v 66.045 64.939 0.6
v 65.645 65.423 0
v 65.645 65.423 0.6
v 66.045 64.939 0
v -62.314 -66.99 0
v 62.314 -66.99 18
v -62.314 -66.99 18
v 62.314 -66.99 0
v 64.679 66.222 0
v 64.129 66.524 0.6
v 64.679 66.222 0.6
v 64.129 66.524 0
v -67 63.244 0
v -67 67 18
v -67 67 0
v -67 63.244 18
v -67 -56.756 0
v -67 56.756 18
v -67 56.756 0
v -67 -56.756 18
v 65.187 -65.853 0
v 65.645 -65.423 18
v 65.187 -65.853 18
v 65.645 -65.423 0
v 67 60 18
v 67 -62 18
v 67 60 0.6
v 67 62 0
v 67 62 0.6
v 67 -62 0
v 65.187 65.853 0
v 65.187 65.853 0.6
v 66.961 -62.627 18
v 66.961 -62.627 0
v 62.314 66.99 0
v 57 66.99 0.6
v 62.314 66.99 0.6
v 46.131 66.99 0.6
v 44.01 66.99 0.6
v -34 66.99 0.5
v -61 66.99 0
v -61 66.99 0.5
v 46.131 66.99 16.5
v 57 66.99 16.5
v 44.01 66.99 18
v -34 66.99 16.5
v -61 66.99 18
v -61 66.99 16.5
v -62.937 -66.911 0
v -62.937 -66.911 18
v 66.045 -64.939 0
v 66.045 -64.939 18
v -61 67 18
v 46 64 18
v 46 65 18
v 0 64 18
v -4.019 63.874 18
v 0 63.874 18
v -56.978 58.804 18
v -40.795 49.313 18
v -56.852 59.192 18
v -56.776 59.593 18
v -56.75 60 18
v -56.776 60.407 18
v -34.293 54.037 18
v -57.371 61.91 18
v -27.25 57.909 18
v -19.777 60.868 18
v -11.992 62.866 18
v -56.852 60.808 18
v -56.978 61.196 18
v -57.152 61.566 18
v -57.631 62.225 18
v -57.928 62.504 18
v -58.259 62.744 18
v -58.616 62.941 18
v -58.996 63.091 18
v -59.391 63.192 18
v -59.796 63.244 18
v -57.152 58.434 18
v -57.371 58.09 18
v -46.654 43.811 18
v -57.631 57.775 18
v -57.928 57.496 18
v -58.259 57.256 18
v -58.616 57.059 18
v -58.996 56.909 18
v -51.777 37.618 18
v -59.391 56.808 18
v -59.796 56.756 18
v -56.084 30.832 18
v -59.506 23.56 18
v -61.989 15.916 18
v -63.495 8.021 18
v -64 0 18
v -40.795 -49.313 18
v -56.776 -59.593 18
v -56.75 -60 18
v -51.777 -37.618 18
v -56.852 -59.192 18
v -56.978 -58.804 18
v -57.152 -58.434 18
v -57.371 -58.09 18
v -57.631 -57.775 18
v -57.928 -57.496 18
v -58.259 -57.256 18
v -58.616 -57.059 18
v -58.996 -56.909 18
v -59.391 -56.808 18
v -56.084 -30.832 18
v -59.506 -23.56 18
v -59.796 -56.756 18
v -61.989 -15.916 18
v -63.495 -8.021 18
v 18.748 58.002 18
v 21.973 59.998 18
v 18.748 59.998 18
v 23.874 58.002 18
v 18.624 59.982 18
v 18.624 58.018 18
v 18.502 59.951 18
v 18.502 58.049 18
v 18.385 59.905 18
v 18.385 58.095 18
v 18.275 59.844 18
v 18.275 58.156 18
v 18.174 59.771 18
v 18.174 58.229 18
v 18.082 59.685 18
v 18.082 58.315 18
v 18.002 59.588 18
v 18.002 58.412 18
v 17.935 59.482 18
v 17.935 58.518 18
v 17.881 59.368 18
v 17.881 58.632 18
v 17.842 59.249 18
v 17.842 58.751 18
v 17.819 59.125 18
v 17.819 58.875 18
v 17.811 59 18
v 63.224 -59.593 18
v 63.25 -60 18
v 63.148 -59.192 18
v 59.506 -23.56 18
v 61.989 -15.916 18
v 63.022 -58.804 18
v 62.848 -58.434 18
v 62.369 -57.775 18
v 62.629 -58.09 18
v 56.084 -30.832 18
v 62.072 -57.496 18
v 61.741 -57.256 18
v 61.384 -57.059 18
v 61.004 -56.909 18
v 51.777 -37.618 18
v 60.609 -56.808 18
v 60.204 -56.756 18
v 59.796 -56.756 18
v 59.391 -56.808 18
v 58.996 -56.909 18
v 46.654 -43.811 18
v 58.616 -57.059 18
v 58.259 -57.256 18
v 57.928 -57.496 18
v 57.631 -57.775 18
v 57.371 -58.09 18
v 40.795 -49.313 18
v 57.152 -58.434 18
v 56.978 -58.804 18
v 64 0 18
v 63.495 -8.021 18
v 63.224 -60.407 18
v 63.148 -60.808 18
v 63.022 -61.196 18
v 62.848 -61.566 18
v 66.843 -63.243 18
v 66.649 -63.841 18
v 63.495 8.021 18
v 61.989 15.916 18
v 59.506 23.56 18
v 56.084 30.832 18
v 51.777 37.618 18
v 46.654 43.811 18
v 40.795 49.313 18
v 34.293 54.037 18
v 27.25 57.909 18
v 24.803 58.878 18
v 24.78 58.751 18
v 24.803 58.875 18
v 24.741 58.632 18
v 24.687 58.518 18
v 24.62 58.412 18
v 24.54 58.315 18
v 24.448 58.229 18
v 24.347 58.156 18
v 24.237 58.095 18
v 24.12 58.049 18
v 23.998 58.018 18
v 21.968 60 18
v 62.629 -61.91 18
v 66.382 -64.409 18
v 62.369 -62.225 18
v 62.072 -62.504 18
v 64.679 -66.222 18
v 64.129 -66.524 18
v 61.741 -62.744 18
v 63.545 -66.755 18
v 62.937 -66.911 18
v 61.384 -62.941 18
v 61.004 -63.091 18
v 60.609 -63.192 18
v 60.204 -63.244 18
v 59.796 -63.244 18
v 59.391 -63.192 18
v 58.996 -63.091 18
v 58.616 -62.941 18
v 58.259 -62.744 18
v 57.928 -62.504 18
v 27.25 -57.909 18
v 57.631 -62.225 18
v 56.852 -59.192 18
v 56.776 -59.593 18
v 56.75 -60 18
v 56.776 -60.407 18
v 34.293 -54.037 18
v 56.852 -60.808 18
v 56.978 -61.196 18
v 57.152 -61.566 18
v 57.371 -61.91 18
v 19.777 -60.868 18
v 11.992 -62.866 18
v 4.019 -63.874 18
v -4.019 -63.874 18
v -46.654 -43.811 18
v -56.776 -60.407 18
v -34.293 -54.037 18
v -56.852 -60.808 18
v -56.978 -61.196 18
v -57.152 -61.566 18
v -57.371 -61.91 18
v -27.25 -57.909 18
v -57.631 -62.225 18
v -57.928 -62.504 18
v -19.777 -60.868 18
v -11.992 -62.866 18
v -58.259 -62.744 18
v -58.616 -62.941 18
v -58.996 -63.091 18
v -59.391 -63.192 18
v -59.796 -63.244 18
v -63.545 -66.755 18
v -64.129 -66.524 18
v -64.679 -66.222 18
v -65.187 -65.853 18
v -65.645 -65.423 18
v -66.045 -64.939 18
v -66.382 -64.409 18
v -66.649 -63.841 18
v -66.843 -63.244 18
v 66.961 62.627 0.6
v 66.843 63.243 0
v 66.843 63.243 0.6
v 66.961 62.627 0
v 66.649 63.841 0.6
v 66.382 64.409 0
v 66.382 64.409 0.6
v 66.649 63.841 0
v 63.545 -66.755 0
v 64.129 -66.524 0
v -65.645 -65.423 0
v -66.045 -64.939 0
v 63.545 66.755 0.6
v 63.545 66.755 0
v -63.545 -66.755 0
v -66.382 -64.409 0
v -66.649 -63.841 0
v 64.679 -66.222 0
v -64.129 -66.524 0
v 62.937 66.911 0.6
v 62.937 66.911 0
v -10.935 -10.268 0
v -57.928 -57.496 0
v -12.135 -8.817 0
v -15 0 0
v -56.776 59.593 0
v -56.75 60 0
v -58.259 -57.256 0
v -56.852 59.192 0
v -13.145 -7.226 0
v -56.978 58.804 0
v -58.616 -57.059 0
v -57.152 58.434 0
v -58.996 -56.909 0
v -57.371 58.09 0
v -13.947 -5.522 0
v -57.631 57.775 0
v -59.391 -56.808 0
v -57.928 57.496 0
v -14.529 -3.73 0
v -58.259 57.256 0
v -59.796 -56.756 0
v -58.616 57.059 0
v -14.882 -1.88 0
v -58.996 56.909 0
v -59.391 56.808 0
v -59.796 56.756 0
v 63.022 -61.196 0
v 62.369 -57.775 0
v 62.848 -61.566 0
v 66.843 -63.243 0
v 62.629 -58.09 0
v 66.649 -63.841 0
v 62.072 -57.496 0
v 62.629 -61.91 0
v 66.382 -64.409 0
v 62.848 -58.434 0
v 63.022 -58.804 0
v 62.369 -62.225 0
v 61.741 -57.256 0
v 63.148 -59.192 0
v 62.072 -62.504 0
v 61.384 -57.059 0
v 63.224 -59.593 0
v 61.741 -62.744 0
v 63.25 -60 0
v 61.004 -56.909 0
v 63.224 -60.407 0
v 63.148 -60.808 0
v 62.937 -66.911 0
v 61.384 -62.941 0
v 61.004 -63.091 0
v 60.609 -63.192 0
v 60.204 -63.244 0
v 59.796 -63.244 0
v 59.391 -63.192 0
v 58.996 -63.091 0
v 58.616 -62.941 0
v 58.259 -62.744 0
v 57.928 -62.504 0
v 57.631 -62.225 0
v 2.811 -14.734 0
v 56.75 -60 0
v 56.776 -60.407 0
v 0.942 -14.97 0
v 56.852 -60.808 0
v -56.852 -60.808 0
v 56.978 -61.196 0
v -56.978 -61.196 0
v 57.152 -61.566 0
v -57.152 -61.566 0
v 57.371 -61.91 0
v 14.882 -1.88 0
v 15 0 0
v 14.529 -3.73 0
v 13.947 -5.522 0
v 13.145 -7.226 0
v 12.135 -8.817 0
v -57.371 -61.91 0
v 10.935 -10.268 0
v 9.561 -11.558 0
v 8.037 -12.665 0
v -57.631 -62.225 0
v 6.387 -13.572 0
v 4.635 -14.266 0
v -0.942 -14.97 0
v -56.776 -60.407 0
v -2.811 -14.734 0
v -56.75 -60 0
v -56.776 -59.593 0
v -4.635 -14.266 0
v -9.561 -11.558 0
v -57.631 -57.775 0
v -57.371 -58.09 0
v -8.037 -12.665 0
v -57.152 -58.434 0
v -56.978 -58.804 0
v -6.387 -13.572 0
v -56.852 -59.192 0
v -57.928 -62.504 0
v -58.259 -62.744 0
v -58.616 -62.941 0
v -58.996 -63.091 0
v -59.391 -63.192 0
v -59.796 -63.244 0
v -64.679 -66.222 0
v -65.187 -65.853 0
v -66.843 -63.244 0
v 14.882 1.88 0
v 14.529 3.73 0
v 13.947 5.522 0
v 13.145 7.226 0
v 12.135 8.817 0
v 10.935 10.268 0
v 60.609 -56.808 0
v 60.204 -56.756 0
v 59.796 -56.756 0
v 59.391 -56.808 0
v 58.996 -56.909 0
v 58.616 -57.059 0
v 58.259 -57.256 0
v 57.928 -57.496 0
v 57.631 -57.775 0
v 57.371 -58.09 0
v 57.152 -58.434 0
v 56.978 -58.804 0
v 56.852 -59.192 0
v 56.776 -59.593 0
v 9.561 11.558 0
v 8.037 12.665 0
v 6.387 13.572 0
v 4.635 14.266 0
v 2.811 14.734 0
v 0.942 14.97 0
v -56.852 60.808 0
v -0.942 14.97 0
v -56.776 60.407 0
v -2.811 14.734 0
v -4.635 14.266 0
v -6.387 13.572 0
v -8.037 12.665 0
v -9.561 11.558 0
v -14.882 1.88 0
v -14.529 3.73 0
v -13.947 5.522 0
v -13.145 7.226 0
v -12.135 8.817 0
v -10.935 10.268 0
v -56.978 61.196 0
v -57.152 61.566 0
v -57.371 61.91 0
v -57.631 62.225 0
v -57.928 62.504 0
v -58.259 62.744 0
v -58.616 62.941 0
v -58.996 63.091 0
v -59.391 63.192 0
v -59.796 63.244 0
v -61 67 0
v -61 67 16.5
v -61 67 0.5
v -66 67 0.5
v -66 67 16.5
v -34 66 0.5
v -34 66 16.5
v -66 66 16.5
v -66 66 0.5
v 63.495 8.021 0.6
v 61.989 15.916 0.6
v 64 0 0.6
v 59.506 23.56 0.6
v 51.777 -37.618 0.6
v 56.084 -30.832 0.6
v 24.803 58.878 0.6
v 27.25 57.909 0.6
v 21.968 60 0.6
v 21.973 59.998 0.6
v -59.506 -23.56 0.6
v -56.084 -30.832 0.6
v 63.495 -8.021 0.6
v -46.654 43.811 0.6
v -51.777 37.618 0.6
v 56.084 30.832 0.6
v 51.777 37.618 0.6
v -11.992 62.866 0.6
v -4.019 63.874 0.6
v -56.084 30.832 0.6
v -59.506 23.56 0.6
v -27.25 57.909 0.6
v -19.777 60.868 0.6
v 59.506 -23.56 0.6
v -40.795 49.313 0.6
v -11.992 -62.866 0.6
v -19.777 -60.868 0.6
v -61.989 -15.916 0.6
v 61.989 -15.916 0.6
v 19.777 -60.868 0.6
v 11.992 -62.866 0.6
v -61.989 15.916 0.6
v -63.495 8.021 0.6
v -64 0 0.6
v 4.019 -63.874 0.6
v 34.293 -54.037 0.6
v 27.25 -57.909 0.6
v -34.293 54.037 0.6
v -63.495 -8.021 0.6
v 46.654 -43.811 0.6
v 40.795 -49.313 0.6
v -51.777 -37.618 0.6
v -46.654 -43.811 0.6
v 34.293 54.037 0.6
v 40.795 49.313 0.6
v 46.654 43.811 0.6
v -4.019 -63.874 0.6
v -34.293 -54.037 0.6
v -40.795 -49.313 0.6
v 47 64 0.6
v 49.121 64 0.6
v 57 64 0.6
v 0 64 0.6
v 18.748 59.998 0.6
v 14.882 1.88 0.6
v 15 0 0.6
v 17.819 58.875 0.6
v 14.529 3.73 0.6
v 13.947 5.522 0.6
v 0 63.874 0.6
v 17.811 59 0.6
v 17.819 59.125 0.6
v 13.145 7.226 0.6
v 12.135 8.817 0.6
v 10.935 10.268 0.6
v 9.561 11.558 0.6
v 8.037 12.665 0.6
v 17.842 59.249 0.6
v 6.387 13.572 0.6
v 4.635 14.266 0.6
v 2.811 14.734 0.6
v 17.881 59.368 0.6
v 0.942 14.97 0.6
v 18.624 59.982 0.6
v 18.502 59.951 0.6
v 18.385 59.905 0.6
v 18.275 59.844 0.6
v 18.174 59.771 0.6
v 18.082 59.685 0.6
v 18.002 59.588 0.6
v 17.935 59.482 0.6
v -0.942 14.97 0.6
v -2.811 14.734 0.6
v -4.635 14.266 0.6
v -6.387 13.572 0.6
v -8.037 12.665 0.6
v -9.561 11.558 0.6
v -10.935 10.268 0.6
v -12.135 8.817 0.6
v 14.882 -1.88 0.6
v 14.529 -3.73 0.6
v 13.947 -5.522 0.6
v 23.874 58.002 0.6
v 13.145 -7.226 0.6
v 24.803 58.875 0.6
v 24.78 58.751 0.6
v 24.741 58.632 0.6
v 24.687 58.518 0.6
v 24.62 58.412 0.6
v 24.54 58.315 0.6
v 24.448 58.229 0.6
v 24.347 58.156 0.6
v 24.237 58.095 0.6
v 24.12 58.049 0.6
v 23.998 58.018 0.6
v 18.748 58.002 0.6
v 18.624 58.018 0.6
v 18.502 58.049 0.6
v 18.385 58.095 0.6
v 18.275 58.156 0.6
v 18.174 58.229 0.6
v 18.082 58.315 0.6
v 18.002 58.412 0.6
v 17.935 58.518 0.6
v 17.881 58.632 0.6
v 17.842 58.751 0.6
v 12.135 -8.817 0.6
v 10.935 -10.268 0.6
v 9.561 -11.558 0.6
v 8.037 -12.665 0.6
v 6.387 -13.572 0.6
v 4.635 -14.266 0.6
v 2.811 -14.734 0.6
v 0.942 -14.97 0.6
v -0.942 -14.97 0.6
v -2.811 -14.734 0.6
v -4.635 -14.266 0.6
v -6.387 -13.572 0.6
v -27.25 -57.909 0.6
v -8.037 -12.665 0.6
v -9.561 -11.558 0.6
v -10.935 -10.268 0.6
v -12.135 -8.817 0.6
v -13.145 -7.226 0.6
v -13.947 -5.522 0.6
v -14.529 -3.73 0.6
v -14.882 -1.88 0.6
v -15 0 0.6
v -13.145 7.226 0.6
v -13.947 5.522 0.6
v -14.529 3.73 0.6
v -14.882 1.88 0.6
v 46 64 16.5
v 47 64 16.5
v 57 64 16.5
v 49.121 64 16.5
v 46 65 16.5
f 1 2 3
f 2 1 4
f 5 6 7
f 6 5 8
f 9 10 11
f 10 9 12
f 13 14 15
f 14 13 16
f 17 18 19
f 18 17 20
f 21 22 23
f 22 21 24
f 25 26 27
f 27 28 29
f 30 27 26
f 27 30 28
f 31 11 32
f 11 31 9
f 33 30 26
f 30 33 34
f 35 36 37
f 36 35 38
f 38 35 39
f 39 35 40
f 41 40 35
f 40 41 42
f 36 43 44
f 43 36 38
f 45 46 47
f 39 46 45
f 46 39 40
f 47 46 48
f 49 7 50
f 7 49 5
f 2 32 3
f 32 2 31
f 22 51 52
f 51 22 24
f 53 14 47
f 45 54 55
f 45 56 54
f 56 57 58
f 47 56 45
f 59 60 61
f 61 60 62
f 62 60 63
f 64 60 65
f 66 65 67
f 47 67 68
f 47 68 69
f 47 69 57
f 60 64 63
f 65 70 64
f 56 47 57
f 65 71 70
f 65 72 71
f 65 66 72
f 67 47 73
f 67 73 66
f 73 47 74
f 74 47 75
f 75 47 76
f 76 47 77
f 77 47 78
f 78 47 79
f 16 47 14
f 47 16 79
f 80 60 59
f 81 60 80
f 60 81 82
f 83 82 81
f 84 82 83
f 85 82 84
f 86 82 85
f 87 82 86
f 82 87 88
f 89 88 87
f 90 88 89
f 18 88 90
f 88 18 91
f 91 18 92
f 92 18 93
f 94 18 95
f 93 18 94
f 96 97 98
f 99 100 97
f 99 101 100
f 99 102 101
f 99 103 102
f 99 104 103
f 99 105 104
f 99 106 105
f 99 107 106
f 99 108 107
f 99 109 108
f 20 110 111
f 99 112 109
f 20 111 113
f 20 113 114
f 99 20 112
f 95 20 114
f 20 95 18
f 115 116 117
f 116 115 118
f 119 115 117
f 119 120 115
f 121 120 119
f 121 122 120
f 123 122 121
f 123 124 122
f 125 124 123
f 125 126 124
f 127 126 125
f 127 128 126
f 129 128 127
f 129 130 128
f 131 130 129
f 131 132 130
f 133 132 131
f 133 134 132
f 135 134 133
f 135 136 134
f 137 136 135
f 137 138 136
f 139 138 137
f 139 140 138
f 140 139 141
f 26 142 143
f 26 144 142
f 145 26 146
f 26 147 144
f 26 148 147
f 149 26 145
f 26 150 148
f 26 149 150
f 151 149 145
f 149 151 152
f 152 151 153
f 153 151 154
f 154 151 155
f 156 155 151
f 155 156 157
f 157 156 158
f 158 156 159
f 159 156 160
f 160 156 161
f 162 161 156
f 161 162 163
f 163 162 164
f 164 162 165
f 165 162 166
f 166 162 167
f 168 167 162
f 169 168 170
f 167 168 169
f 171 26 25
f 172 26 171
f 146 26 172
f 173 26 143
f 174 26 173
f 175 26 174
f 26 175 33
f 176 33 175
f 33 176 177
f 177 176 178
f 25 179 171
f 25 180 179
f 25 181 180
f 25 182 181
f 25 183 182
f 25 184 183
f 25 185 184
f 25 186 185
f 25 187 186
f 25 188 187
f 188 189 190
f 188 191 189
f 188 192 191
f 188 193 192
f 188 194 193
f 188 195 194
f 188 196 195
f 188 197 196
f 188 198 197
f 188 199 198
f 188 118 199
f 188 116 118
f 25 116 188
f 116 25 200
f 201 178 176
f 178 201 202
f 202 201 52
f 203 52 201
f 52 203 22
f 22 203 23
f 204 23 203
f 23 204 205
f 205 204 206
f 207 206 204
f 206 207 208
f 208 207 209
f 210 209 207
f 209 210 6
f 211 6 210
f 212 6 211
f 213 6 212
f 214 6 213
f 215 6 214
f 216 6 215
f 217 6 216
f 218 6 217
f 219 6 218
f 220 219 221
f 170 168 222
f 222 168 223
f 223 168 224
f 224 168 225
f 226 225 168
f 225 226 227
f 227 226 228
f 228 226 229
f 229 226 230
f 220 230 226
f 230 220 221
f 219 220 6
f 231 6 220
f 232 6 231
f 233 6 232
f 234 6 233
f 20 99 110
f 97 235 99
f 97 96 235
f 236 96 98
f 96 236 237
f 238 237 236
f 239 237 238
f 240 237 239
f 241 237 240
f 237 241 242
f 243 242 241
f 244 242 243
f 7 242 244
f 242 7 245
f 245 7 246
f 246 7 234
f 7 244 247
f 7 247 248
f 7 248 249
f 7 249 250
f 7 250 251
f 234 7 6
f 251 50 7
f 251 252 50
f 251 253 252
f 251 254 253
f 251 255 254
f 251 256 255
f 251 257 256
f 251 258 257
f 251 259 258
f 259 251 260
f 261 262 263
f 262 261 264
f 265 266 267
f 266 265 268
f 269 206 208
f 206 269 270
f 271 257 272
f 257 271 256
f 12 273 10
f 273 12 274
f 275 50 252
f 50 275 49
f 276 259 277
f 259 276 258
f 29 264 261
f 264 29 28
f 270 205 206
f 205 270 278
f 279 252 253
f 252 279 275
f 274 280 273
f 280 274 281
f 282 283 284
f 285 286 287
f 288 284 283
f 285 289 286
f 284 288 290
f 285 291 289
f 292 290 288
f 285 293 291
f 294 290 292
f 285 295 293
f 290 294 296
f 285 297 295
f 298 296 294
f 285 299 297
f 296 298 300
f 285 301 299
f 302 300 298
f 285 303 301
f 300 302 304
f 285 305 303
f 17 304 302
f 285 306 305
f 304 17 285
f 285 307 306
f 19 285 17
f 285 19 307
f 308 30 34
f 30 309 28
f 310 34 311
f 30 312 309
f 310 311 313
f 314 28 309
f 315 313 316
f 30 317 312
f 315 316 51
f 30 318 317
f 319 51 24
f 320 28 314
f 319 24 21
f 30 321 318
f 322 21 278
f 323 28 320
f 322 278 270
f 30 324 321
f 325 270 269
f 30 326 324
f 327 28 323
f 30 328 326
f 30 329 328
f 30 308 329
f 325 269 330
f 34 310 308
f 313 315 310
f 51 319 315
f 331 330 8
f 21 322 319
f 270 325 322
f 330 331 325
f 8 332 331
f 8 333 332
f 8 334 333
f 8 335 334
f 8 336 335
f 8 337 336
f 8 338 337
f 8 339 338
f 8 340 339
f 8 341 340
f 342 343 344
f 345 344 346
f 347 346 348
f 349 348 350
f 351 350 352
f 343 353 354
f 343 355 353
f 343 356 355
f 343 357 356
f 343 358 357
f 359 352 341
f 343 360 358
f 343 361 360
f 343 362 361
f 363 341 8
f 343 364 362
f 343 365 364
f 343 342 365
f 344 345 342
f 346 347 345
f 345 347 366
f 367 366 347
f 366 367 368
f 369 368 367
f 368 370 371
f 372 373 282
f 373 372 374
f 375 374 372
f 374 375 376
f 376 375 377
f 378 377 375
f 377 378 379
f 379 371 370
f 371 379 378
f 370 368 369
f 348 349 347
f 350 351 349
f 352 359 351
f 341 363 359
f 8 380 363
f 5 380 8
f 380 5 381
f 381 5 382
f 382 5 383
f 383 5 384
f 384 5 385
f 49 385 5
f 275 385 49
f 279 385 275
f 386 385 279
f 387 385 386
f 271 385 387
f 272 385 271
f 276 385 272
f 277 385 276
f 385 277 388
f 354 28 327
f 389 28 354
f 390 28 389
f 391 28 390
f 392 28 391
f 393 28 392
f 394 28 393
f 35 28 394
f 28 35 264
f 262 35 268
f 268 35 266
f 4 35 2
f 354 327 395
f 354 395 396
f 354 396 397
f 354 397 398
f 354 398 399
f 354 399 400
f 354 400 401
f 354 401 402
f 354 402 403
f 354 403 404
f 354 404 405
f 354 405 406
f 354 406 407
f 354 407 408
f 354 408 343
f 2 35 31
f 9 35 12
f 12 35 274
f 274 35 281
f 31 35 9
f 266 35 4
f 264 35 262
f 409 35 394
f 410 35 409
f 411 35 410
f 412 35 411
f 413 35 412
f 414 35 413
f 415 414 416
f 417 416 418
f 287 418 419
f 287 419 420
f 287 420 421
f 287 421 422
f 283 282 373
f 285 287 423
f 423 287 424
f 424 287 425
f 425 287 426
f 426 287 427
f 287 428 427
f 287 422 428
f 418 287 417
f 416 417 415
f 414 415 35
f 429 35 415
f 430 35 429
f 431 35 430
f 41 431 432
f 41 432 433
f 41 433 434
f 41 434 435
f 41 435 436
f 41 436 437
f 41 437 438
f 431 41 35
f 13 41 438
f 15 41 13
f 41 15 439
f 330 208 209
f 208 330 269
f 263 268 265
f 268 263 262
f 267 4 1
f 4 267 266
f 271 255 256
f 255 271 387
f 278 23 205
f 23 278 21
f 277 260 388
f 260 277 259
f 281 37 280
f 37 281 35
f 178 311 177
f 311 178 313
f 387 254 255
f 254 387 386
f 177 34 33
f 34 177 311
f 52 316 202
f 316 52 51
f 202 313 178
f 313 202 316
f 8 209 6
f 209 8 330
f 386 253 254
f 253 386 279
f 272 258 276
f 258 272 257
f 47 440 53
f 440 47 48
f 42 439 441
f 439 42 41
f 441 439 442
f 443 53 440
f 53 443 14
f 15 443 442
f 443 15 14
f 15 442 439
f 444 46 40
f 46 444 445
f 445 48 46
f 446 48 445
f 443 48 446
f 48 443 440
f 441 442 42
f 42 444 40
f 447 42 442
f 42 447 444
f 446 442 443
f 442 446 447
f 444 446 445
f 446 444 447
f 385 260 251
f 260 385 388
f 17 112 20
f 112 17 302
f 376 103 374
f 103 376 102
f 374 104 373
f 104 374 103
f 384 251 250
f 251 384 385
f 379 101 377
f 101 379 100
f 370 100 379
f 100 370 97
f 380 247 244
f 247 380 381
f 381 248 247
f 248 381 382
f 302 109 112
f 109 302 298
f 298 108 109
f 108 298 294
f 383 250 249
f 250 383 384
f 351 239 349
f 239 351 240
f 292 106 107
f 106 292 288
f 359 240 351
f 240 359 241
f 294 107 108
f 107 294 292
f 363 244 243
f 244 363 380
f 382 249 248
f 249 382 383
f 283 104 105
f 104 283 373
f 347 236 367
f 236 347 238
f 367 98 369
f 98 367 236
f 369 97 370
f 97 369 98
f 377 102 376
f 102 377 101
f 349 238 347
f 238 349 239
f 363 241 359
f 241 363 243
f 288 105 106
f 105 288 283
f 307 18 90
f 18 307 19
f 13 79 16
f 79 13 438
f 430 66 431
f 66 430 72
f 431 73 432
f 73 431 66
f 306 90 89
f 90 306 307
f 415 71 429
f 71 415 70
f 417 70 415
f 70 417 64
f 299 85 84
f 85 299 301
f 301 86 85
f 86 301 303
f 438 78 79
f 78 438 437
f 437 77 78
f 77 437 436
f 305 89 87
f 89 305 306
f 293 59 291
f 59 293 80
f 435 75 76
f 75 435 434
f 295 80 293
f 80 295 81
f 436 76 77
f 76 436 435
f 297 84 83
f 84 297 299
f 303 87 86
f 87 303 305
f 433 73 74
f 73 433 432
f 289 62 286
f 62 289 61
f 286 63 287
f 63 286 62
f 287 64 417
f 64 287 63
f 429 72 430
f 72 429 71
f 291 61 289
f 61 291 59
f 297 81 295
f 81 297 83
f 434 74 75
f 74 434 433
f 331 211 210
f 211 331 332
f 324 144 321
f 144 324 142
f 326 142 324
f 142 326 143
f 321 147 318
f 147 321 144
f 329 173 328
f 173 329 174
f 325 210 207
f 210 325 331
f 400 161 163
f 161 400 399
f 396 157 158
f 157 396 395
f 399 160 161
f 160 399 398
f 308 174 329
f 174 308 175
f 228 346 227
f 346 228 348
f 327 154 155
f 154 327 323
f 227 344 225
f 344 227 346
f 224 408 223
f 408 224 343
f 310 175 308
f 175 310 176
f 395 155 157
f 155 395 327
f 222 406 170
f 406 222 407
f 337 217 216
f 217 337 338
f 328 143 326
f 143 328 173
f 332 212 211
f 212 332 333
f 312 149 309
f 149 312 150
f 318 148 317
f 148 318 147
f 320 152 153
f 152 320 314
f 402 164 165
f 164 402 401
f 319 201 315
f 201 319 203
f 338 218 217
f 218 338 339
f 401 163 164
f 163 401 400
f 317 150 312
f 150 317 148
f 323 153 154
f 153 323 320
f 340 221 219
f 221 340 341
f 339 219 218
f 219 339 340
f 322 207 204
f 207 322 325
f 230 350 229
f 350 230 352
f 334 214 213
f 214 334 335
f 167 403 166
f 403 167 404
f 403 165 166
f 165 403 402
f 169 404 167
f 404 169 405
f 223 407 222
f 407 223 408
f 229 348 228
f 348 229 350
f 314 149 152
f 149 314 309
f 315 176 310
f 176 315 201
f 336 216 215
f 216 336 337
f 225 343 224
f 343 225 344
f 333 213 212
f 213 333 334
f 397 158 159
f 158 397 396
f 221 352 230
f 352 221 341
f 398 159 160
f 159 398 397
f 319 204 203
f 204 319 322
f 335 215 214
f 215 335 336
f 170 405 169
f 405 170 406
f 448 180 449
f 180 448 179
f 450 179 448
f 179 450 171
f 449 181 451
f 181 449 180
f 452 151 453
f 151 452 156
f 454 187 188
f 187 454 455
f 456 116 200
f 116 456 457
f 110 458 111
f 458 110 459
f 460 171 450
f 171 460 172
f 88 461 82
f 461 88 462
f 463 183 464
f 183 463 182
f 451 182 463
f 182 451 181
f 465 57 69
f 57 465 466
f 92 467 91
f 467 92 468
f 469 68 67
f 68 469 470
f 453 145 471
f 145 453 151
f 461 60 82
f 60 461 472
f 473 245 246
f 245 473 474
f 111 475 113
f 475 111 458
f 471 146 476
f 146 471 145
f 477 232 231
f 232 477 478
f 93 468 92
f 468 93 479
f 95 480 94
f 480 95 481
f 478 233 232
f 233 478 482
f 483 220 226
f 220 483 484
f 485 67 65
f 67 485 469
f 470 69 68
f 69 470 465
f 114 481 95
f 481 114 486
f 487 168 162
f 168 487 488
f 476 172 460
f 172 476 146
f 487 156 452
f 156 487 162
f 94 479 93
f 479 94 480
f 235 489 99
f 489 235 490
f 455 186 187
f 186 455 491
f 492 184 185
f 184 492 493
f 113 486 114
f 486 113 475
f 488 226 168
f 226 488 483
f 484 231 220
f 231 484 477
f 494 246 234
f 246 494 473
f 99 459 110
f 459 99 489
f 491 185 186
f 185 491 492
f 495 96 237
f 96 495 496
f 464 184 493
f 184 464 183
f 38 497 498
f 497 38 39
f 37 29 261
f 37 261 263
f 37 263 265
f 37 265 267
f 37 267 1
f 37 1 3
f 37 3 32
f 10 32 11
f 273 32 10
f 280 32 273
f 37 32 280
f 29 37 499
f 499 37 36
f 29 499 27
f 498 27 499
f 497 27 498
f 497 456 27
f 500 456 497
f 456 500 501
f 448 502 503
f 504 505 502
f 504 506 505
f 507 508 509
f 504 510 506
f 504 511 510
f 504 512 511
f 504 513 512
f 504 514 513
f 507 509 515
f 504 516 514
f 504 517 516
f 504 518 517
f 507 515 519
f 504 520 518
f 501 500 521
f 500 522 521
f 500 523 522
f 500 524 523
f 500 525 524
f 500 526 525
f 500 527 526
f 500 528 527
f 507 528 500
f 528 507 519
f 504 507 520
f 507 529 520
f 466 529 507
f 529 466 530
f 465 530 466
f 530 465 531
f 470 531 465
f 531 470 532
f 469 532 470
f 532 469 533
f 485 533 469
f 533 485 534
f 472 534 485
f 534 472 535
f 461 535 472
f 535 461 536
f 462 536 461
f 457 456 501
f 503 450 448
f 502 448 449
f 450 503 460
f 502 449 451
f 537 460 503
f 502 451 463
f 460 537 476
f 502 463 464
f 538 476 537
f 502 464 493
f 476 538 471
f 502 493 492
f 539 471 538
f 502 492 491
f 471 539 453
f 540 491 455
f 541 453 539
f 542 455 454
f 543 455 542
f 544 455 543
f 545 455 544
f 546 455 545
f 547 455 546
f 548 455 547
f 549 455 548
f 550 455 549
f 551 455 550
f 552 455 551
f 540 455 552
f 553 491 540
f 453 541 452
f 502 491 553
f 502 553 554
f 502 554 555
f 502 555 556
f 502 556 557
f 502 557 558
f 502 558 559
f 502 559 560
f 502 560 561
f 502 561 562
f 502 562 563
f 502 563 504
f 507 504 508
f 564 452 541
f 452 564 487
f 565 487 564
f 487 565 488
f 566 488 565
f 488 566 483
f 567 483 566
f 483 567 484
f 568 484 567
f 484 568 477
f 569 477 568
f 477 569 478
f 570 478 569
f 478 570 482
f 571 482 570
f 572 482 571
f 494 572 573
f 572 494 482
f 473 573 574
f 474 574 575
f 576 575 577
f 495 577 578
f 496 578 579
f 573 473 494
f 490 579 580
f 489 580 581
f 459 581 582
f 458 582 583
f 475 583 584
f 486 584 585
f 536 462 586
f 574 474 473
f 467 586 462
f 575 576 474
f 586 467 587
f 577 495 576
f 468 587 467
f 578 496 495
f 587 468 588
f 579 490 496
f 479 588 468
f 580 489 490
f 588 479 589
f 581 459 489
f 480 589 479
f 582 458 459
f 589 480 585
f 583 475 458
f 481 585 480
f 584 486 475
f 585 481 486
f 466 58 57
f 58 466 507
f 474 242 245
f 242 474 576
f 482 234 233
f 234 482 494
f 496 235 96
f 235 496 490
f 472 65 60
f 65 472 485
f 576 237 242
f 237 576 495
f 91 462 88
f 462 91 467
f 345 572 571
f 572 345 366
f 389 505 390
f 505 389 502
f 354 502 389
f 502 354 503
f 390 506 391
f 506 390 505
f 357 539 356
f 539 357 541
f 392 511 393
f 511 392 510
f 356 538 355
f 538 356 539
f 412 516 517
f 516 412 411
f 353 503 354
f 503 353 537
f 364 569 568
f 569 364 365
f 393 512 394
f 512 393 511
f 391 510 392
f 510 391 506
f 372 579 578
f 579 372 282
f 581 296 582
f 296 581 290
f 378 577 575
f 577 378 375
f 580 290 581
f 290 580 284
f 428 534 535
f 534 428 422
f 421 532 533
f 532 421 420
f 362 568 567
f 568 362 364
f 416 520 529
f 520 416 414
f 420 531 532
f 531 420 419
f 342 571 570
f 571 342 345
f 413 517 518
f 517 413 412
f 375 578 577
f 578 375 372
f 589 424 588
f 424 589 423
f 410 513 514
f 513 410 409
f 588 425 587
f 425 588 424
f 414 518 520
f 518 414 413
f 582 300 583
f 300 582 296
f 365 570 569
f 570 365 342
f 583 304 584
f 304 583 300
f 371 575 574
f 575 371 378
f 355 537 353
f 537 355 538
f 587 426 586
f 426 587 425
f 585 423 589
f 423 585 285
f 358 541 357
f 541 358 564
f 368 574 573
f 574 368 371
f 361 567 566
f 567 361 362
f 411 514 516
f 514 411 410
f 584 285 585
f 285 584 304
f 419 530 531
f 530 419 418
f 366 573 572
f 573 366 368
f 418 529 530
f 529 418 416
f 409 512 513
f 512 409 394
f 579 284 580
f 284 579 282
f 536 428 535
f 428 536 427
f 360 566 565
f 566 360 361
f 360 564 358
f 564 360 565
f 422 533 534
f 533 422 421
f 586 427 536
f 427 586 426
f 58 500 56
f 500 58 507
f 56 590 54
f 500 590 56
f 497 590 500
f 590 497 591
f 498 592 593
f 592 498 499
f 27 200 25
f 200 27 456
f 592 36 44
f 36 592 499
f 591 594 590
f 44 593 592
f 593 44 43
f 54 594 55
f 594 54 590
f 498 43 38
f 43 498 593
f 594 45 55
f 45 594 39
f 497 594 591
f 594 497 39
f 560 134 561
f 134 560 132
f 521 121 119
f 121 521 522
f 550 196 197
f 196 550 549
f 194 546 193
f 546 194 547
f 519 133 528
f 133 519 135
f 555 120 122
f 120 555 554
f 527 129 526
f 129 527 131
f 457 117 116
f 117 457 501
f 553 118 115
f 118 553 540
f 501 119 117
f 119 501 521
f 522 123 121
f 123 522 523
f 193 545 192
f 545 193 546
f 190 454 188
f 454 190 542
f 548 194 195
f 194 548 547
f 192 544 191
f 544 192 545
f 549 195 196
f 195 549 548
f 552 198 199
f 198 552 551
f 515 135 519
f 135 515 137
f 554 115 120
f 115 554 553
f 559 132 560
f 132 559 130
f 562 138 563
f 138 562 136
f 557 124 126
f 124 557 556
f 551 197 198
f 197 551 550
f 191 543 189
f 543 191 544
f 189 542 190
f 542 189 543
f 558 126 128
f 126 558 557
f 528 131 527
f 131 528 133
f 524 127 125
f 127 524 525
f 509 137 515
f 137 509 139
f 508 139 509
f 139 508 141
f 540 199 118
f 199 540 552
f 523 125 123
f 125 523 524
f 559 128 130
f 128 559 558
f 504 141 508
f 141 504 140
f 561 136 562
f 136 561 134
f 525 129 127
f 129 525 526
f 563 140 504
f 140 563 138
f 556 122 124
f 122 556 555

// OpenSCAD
$fn = 50;


union() {
	difference() {
		union() {
			translate(v = [0, 0, 0]) {
				rotate(a = [0, 0, 0]) {
					hull() {
						translate(v = [-62.0000000000, 62.0000000000, 0]) {
							rotate(a = [0, 0, 0]) {
								translate(v = [0, 0, 0]) {
									rotate(a = [0, 0, 0]) {
										cylinder(h = 18, r = 5);
									}
								}
							}
						}
						translate(v = [62.0000000000, 62.0000000000, 0]) {
							rotate(a = [0, 0, 0]) {
								translate(v = [0, 0, 0]) {
									rotate(a = [0, 0, 0]) {
										cylinder(h = 18, r = 5);
									}
								}
							}
						}
						translate(v = [-62.0000000000, -62.0000000000, 0]) {
							rotate(a = [0, 0, 0]) {
								translate(v = [0, 0, 0]) {
									rotate(a = [0, 0, 0]) {
										cylinder(h = 18, r = 5);
									}
								}
							}
						}
						translate(v = [62.0000000000, -62.0000000000, 0]) {
							rotate(a = [0, 0, 0]) {
								translate(v = [0, 0, 0]) {
									rotate(a = [0, 0, 0]) {
										cylinder(h = 18, r = 5);
									}
								}
							}
						}
					}
				}
			}
			translate(v = [-67.0000000000, 61.0000000000, 0]) {
				rotate(a = [0, 0, 0]) {
					cube(size = [6, 6, 18]);
				}
			}
		}
		union() {
			#translate(v = [-66.0000000000, 66.0000000000, 0.5000000000]) {
				rotate(a = [0, 0, 0]) {
					cube(size = [32, 1, 16]);
				}
			}
			translate(v = [-67.5000000000, -60.0000000000, -125]) {
				rotate(a = [0, 0, 0]) {
					hull() {
						translate(v = [7.5000000000, 0, 0]) {
							rotate(a = [0, 0, 0]) {
								translate(v = [0, 0, 0]) {
									rotate(a = [0, 0, 0]) {
										cylinder(h = 250, r = 3.2500000000);
									}
								}
							}
						}
						translate(v = [-7.5000000000, 0, 0]) {
							rotate(a = [0, 0, 0]) {
								translate(v = [0, 0, 0]) {
									rotate(a = [0, 0, 0]) {
										cylinder(h = 250, r = 3.2500000000);
									}
								}
							}
						}
					}
				}
			}
			translate(v = [-67.5000000000, 60.0000000000, -125]) {
				rotate(a = [0, 0, 0]) {
					hull() {
						translate(v = [7.5000000000, 0, 0]) {
							rotate(a = [0, 0, 0]) {
								translate(v = [0, 0, 0]) {
									rotate(a = [0, 0, 0]) {
										cylinder(h = 250, r = 3.2500000000);
									}
								}
							}
						}
						translate(v = [-7.5000000000, 0, 0]) {
							rotate(a = [0, 0, 0]) {
								translate(v = [0, 0, 0]) {
									rotate(a = [0, 0, 0]) {
										cylinder(h = 250, r = 3.2500000000);
									}
								}
							}
						}
					}
				}
			}
			translate(v = [60.0000000000, -60.0000000000, -125.0000000000]) {
				rotate(a = [0, 0, 0]) {
					cylinder(h = 250, r = 3.2500000000);
				}
			}
			translate(v = [0, 0, 0.6000000000]) {
				rotate(a = [0, 0, 0]) {
					cylinder(h = 20.4000000000, r = 64.0000000000);
				}
			}
			translate(v = [0, 0, -9.0000000000]) {
				rotate(a = [0, 0, 0]) {
					cylinder(h = 18, r = 15.0000000000);
				}
			}
			translate(v = [0.0000000000, 60.0000000000, 0.6000000000]) {
				rotate(a = [0, 0, 0]) {
					cube(size = [67.0000000000, 4, 20.4000000000]);
				}
			}
			translate(v = [57.0000000000, 60.0000000000, 0.6000000000]) {
				rotate(a = [0, 0, 0]) {
					cube(size = [10, 7, 20.4000000000]);
				}
			}
			translate(v = [46.0000000000, 60.0000000000, 16.5000000000]) {
				rotate(a = [0, 0, 0]) {
					cube(size = [21, 7, 1.5000000000]);
				}
			}
			translate(v = [43.2500000000, 67.7500000000, 0.6000000000]) {
				rotate(a = [0, 0, -45]) {
					cube(size = [7.5000000000, 1.5000000000, 20.4000000000]);
				}
			}
			translate(v = [12.0610000000, 58.0000000000, 0.6000000000]) {
				rotate(a = [0, 0, 0]) {
					cube(size = [7.5000000000, 2, 17.4000000000]);
				}
			}
		}
	}
	union() {
		translate(v = [21.3110000000, 59.0000000000, 0]) {
			rotate(a = [0, 0, 0]) {
				hull() {
					translate(v = [2.5000000000, 0, 0]) {
						rotate(a = [0, 0, 0]) {
							#translate(v = [0, 0, 0]) {
								rotate(a = [0, 0, 0]) {
									cylinder(h = 18, r = 1.0000000000);
								}
							}
						}
					}
					translate(v = [-2.5000000000, 0, 0]) {
						rotate(a = [0, 0, 0]) {
							#translate(v = [0, 0, 0]) {
								rotate(a = [0, 0, 0]) {
									cylinder(h = 18, r = 1.0000000000);
								}
							}
						}
					}
				}
			}
		}
	}
}
